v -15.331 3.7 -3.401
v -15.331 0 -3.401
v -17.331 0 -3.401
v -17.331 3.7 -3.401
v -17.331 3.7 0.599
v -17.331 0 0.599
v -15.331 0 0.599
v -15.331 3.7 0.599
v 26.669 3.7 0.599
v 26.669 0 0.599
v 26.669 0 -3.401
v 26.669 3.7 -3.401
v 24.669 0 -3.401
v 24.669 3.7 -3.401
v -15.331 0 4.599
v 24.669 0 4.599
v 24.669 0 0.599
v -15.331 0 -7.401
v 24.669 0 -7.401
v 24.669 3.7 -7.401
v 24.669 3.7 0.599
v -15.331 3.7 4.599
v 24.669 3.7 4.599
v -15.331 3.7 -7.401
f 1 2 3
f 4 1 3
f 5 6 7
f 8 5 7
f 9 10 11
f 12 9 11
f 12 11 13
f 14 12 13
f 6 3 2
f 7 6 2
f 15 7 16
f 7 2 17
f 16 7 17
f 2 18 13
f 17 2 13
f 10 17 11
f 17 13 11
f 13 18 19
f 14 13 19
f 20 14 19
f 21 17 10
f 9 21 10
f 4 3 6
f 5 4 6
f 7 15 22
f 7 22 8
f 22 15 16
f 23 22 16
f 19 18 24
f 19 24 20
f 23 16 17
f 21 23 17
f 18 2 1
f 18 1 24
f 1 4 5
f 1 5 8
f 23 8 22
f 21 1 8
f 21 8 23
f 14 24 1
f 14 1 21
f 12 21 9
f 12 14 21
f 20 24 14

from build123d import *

# Parameters (mm, degrees)
SKETCH1_W           = 40
SKETCH1_H           = 4
SKETCH1_W_2         = 2
BOSS_EXTRUDE1_DEPTH = 3.7


with BuildPart() as part:
    # Sketch1 → Boss-Extrude1 (new body)
    with BuildSketch(Plane(origin=(0, 0, 0), x_dir=(1, 0, 0), z_dir=(0, 1, 0))):
        Polygon((-15.330595421, 3.400821374), (-17.330595421, 3.400821374), (-17.330595421, -0.599178626), (-15.330595421, -0.599178626), (24.669404579, -0.599178626), (24.669404579, 3.400821374), align=None)
        with Locations((4.669404579, -2.599178626)):
            Rectangle(SKETCH1_W, SKETCH1_H)
        with Locations((25.669404579, 1.400821374)):
            Rectangle(SKETCH1_W_2, SKETCH1_H)
        with Locations((4.669404579, 5.400821374)):
            Rectangle(SKETCH1_W, SKETCH1_H)
    extrude(amount=BOSS_EXTRUDE1_DEPTH)


solid = part.part
